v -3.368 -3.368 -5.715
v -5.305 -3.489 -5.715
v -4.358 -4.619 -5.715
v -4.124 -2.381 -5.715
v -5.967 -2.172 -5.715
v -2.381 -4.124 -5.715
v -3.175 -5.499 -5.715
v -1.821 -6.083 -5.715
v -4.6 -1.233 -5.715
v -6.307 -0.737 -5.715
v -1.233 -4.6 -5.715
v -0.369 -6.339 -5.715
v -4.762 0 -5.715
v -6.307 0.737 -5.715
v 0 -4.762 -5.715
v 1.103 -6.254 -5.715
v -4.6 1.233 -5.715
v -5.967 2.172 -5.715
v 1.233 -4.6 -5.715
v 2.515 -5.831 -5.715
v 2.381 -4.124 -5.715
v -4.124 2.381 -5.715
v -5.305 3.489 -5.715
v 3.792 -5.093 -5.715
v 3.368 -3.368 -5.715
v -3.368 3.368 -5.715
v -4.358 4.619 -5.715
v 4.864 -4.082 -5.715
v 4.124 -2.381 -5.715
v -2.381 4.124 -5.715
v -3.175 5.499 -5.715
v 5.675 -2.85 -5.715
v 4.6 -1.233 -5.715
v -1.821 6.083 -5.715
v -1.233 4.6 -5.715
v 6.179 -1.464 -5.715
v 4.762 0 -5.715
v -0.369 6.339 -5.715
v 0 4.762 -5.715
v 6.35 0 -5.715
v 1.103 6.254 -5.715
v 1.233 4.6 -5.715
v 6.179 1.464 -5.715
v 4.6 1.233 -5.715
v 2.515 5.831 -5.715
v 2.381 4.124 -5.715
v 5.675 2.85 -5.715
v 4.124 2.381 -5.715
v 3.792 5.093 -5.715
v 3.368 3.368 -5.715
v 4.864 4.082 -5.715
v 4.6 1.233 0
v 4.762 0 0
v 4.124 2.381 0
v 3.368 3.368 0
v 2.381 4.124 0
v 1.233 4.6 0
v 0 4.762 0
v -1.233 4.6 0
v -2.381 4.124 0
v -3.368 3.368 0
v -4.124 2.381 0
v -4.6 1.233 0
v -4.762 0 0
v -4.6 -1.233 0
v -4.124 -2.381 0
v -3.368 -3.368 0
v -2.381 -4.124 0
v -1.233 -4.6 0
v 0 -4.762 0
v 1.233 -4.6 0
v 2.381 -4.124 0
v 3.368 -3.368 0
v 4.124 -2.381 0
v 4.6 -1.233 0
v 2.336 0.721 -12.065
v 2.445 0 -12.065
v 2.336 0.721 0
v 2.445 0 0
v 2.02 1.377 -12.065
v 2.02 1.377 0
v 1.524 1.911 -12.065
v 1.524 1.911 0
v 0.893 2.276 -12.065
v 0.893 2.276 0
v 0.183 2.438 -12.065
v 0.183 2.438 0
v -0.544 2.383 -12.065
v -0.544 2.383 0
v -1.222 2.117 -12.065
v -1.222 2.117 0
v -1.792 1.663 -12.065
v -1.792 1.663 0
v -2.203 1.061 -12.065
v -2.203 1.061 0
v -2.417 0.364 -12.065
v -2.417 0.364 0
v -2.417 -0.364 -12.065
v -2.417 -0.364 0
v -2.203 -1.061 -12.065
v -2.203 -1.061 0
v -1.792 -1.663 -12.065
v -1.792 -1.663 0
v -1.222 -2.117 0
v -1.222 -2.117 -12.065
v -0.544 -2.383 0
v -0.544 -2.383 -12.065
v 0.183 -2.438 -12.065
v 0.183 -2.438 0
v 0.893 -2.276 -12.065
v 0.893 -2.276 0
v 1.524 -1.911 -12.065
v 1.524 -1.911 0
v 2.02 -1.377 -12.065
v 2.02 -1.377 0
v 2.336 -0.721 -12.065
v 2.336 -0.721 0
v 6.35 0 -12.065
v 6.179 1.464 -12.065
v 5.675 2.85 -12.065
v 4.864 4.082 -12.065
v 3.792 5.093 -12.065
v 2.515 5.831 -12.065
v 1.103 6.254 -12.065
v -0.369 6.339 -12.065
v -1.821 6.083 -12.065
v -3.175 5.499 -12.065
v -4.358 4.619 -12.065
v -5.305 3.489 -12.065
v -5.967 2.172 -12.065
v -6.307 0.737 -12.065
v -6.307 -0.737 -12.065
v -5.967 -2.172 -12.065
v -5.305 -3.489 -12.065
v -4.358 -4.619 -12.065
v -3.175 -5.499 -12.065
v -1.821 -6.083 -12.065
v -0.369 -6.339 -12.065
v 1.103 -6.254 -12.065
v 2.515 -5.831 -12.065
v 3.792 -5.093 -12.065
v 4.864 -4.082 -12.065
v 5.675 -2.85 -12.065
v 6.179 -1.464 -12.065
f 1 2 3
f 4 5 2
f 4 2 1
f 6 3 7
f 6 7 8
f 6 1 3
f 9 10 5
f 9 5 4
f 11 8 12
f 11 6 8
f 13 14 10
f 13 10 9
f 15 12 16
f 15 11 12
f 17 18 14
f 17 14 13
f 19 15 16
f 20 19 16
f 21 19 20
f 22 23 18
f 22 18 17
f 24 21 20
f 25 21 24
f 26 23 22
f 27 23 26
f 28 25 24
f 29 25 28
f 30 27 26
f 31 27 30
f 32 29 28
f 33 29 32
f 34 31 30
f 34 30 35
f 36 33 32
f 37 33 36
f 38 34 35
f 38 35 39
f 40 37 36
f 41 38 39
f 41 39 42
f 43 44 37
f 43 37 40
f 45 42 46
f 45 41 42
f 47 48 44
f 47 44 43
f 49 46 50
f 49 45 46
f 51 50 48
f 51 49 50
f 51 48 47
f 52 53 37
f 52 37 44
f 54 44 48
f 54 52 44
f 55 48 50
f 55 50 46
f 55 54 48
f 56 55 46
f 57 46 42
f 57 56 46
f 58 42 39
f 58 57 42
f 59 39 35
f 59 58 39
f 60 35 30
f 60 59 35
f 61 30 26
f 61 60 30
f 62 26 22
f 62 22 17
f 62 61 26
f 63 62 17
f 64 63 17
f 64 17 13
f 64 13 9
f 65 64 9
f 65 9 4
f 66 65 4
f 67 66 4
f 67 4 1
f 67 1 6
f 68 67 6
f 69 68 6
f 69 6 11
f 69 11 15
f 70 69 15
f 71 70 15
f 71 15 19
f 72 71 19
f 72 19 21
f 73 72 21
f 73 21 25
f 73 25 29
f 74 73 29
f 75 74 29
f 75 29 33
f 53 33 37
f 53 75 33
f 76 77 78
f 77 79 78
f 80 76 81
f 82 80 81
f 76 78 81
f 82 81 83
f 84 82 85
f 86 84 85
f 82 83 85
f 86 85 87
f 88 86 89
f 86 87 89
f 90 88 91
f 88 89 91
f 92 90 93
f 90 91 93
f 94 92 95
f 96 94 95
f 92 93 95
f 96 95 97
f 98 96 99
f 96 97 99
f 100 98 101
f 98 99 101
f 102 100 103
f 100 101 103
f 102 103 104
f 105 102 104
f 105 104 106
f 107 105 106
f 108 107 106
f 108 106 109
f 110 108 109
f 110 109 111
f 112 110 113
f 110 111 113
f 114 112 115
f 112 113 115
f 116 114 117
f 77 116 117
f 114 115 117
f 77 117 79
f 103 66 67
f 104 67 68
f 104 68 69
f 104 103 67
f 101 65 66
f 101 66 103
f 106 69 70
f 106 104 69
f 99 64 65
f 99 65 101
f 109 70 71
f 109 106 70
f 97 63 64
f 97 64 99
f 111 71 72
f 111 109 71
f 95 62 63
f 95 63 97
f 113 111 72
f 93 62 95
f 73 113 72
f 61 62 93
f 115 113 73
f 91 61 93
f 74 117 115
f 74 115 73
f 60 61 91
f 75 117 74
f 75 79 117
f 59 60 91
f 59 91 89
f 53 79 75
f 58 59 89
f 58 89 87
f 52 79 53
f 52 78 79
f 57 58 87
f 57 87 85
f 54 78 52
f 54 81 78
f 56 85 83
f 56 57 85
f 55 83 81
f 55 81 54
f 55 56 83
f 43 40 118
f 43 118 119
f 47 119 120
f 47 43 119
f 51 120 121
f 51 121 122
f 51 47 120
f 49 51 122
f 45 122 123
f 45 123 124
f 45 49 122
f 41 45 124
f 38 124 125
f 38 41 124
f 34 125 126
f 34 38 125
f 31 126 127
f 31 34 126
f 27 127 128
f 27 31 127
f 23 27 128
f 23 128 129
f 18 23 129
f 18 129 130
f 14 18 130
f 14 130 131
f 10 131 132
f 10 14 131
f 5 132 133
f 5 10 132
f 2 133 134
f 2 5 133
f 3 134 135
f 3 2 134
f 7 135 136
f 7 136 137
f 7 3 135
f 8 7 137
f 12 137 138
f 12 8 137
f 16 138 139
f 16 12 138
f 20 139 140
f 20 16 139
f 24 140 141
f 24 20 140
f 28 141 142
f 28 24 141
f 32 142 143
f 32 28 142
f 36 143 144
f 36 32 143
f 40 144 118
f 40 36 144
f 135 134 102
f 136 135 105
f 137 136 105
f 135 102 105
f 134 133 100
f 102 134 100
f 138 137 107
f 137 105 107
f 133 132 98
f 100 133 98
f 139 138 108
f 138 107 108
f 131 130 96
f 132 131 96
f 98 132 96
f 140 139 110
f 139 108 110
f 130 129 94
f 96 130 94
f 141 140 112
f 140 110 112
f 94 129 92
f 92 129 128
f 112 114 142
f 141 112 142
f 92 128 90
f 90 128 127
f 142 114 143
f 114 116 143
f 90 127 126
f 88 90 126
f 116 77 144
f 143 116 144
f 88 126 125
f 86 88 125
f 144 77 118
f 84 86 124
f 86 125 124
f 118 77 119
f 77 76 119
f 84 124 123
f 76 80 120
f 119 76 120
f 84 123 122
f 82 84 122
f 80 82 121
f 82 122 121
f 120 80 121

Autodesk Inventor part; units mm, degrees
ref_plane "YZ Plane" through (0, 0, 0) normal (1, 0, 0) x (0, 1, 0)
ref_plane "XZ Plane" through (0, 0, 0) normal (0, 1, 0) x (-1, 0, 0)
ref_plane "XY Plane" through (0, 0, 0) normal (0, 0, 1) x (1, 0, 0)
sketch "Sketch1" plane through (0, 0, 0) normal (0, 0, 1) x (1, 0, 0)
  circle A0 centre (0, 0) radius 6.35
  dimension "d0" = 12.7
extrude "Extrusion1" add sketch "Sketch1" against normal blind 12.065
sketch "Sketch2" plane through (0, 0, 0) normal (0, 0, 1) x (1, 0, 0)
  circle A0 centre (0, 0) radius 6.35 projected
  circle A1 centre (0, 0) radius 4.7625
  dimension "d3" = 9.525
extrude "Extrusion2" cut sketch "Sketch2" against normal blind 5.715
sketch "Sketch3" plane through (0, 0, 0) normal (0, 0, 1) x (1, 0, 0)
  circle A0 centre (0, 0) radius 4.7625 projected
  circle A1 centre (0, 0) radius 2.4447
  dimension "d6" = 4.8895
extrude "Extrusion3" cut sketch "Sketch3" against normal through all contours A1
properties part number "T-Spacer .375"
